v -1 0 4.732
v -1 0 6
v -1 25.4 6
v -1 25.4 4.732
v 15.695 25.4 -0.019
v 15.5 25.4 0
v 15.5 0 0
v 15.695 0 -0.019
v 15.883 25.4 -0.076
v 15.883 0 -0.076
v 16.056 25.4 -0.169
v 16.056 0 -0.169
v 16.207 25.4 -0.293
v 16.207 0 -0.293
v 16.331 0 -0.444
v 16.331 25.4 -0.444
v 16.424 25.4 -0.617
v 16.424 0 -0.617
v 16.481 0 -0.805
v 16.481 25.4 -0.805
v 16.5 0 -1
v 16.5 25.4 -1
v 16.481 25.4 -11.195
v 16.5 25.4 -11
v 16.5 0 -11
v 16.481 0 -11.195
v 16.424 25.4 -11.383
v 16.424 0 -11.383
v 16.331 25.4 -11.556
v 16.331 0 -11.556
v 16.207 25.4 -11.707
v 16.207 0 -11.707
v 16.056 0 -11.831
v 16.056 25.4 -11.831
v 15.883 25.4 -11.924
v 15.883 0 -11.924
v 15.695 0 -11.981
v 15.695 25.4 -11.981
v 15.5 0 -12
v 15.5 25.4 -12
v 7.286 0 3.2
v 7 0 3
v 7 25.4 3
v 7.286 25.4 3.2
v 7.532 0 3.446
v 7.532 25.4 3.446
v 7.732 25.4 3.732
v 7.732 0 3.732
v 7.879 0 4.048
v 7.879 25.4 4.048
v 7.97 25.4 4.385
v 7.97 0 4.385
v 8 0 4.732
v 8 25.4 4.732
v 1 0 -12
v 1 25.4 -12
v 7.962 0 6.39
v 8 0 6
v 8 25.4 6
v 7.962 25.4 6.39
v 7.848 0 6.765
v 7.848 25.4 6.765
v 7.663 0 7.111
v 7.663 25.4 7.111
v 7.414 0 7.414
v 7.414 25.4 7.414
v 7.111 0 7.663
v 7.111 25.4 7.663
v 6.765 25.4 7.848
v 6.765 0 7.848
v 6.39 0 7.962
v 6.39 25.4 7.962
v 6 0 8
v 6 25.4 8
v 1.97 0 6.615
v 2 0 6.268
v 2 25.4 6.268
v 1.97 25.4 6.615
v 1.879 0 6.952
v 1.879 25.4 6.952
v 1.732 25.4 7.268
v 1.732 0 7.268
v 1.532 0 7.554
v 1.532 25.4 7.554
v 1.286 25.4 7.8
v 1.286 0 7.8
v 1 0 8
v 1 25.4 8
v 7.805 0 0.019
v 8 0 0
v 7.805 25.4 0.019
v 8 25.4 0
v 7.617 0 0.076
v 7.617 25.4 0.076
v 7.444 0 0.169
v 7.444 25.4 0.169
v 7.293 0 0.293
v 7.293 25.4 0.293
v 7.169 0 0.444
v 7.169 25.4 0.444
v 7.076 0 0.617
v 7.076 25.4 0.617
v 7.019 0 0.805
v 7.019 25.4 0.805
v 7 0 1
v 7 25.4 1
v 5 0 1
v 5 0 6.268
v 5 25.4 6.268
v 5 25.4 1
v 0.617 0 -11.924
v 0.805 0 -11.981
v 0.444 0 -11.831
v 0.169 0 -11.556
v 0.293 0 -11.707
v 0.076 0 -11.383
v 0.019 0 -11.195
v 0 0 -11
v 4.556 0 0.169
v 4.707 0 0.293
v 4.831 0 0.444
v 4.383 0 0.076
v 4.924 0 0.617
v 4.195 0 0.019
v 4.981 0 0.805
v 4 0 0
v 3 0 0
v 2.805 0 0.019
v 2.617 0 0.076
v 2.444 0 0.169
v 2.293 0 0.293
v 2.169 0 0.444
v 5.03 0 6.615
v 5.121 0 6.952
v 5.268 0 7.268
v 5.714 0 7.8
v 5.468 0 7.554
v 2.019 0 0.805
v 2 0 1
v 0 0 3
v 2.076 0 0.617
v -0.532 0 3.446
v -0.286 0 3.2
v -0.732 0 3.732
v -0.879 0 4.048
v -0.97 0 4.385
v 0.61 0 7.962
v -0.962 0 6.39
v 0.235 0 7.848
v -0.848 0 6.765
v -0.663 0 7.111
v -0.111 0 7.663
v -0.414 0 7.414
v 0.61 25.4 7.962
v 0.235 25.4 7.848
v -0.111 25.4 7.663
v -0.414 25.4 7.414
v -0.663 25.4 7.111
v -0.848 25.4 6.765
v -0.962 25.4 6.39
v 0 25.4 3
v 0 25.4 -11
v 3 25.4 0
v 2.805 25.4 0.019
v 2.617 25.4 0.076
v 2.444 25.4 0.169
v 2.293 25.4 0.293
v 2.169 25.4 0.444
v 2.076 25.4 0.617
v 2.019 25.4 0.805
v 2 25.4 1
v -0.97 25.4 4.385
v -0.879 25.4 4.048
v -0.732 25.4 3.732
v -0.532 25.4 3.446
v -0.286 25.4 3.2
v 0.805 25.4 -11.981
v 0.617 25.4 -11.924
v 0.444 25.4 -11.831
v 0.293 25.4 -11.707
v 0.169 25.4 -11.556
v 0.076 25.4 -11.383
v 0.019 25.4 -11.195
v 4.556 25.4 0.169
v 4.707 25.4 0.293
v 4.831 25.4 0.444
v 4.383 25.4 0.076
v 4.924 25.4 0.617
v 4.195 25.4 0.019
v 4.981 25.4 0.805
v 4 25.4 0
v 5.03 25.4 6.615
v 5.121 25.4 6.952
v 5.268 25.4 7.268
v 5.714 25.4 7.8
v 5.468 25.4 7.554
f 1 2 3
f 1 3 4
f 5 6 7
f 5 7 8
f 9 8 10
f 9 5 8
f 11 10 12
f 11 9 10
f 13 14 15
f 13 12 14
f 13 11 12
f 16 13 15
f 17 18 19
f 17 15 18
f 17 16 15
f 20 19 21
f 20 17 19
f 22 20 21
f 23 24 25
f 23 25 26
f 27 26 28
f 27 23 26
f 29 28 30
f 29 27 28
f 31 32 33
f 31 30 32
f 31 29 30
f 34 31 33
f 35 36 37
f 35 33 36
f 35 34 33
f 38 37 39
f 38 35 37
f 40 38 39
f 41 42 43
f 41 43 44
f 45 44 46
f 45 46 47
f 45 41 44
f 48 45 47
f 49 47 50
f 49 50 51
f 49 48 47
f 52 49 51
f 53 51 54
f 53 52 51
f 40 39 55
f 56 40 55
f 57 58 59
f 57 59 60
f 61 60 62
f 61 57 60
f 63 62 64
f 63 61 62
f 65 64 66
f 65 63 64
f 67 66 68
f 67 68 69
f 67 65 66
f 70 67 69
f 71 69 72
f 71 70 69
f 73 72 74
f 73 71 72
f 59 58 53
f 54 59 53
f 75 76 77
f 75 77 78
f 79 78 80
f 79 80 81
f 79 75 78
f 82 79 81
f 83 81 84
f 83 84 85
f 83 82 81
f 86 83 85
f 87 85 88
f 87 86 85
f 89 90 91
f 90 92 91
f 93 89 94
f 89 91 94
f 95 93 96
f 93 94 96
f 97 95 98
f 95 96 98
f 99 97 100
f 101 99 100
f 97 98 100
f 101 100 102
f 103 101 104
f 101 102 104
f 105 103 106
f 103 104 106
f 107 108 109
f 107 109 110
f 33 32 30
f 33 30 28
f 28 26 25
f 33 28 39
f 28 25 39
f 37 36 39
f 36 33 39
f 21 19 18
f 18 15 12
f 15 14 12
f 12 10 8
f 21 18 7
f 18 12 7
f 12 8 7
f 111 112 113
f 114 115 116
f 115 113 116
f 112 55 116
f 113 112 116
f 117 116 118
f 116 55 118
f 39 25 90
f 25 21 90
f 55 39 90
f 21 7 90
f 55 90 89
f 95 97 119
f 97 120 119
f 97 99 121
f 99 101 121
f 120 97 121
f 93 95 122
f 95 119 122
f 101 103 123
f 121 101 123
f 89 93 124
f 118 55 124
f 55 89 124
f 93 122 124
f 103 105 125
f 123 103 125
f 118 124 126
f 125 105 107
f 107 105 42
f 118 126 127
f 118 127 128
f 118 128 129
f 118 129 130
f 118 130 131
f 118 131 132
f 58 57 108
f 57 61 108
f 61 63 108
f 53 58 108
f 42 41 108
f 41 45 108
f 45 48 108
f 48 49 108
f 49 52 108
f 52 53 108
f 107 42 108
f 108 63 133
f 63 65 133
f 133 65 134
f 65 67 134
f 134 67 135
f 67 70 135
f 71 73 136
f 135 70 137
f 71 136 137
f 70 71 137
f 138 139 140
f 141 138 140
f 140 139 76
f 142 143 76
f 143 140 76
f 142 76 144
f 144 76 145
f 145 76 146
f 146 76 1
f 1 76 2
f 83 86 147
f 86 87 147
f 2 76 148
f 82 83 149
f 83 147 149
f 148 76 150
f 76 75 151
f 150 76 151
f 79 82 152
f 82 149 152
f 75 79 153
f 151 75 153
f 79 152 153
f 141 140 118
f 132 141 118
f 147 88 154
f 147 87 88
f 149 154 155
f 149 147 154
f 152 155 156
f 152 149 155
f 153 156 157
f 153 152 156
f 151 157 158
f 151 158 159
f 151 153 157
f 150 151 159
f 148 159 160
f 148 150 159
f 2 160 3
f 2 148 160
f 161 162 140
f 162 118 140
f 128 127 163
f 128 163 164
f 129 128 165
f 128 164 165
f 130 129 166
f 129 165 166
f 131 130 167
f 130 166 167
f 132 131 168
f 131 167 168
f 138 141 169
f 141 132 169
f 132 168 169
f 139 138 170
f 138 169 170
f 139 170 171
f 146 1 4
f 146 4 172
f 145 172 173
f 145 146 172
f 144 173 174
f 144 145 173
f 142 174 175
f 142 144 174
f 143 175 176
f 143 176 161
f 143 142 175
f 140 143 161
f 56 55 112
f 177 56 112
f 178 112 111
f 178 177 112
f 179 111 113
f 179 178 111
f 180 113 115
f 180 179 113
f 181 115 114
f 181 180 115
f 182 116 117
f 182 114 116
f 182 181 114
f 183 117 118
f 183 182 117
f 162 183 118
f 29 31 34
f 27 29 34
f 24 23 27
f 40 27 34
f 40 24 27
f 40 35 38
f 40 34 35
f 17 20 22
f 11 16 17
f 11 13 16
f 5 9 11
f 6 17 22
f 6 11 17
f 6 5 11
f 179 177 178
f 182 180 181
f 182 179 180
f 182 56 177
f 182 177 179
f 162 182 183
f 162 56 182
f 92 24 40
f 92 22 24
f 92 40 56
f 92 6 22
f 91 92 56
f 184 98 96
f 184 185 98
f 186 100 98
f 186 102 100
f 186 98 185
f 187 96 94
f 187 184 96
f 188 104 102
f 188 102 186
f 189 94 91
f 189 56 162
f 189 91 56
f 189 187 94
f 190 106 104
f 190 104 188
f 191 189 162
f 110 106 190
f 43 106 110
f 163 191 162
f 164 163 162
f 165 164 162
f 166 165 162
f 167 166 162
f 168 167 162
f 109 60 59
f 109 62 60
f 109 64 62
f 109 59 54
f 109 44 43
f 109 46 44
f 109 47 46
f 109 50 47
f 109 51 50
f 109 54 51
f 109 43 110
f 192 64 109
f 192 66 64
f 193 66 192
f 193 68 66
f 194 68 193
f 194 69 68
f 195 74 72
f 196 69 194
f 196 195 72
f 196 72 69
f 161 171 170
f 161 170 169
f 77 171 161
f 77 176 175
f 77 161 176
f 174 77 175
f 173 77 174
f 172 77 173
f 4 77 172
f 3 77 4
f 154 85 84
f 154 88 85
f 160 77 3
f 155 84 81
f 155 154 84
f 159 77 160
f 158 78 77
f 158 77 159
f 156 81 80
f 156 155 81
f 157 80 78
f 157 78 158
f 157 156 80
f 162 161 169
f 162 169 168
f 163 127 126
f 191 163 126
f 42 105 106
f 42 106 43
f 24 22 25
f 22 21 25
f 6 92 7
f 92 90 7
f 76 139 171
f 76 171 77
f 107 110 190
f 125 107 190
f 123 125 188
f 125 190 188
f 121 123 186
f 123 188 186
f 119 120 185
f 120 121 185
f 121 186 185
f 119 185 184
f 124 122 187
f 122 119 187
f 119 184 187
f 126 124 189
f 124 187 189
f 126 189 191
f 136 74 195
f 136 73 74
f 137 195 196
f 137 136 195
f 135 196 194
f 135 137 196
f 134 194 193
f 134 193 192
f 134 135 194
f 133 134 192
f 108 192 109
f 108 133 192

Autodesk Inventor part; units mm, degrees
ref_plane "YZ Plane" through (0, 0, 0) normal (1, 0, 0) x (0, 1, 0)
ref_plane "XZ Plane" through (0, 0, 0) normal (0, 1, 0) x (-1, 0, 0)
ref_plane "XY Plane" through (0, 0, 0) normal (0, 0, 1) x (1, 0, 0)
sketch "Sketch1" plane through (0, 0, 0) normal (0, 1, 0) x (-1, 0, 0)
  line L0 (0, 0) -> (-16.5, 0)
  line L1 (-16.5, 0) -> (-16.5, -12)
  line L2 (-16.5, -12) -> (0, -12)
  line L3 (0, -12) -> (0, 0)
  line L4 (-5, 0) -> (-7, 0)
  line L5 (-7, 0) -> (-7, 8)
  line L6 (-7, 8) -> (-5, 8)
  line L7 (-5, 8) -> (-5, 0)
  line L8 (0, 0) -> (-2, 0)
  line L9 (-2, 0) -> (-2, 8)
  line L10 (-2, 8) -> (0, 8)
  line L11 (0, 8) -> (0, 0)
  line L12 (0, 8) -> (1, 8)
  line L13 (1, 8) -> (1, 3)
  line L14 (1, 3) -> (0, 3)
  line L15 (0, 3) -> (0, 8)
  line L16 (-7, 8) -> (-8, 8)
  line L17 (-8, 8) -> (-8, 3)
  line L18 (-8, 3) -> (-7, 3)
  line L19 (-7, 3) -> (-7, 8)
  dimension "d0" = 16.5
  dimension "d1" = 12
  dimension "d4" = 2
  dimension "d5" = 8
  dimension "d6" = 3
  dimension "d9" = 1
  dimension "d10" = 5
extrude "Extrusion1" add sketch "Sketch1" along normal blind 25.4
fillet "Fillet1" radius 2 4 edges at (8, 12.7, 3) (8, 12.7, 8) (-1, 12.7, 3) (-1, 12.7, 8)
fillet "Fillet2" radius 1 3 edges at (16.5, 12.7, 0) (16.5, 12.7, -12) (0, 12.7, -12)
fillet "Fillet3" radius 1 3 edges at (5, 12.7, 0) (2, 12.7, 0) (7, 12.7, 0)
fillet "Fillet4" radius 2 2 edges at (5, 12.7, 8) (2, 12.7, 8)
properties part number "ledholder"
